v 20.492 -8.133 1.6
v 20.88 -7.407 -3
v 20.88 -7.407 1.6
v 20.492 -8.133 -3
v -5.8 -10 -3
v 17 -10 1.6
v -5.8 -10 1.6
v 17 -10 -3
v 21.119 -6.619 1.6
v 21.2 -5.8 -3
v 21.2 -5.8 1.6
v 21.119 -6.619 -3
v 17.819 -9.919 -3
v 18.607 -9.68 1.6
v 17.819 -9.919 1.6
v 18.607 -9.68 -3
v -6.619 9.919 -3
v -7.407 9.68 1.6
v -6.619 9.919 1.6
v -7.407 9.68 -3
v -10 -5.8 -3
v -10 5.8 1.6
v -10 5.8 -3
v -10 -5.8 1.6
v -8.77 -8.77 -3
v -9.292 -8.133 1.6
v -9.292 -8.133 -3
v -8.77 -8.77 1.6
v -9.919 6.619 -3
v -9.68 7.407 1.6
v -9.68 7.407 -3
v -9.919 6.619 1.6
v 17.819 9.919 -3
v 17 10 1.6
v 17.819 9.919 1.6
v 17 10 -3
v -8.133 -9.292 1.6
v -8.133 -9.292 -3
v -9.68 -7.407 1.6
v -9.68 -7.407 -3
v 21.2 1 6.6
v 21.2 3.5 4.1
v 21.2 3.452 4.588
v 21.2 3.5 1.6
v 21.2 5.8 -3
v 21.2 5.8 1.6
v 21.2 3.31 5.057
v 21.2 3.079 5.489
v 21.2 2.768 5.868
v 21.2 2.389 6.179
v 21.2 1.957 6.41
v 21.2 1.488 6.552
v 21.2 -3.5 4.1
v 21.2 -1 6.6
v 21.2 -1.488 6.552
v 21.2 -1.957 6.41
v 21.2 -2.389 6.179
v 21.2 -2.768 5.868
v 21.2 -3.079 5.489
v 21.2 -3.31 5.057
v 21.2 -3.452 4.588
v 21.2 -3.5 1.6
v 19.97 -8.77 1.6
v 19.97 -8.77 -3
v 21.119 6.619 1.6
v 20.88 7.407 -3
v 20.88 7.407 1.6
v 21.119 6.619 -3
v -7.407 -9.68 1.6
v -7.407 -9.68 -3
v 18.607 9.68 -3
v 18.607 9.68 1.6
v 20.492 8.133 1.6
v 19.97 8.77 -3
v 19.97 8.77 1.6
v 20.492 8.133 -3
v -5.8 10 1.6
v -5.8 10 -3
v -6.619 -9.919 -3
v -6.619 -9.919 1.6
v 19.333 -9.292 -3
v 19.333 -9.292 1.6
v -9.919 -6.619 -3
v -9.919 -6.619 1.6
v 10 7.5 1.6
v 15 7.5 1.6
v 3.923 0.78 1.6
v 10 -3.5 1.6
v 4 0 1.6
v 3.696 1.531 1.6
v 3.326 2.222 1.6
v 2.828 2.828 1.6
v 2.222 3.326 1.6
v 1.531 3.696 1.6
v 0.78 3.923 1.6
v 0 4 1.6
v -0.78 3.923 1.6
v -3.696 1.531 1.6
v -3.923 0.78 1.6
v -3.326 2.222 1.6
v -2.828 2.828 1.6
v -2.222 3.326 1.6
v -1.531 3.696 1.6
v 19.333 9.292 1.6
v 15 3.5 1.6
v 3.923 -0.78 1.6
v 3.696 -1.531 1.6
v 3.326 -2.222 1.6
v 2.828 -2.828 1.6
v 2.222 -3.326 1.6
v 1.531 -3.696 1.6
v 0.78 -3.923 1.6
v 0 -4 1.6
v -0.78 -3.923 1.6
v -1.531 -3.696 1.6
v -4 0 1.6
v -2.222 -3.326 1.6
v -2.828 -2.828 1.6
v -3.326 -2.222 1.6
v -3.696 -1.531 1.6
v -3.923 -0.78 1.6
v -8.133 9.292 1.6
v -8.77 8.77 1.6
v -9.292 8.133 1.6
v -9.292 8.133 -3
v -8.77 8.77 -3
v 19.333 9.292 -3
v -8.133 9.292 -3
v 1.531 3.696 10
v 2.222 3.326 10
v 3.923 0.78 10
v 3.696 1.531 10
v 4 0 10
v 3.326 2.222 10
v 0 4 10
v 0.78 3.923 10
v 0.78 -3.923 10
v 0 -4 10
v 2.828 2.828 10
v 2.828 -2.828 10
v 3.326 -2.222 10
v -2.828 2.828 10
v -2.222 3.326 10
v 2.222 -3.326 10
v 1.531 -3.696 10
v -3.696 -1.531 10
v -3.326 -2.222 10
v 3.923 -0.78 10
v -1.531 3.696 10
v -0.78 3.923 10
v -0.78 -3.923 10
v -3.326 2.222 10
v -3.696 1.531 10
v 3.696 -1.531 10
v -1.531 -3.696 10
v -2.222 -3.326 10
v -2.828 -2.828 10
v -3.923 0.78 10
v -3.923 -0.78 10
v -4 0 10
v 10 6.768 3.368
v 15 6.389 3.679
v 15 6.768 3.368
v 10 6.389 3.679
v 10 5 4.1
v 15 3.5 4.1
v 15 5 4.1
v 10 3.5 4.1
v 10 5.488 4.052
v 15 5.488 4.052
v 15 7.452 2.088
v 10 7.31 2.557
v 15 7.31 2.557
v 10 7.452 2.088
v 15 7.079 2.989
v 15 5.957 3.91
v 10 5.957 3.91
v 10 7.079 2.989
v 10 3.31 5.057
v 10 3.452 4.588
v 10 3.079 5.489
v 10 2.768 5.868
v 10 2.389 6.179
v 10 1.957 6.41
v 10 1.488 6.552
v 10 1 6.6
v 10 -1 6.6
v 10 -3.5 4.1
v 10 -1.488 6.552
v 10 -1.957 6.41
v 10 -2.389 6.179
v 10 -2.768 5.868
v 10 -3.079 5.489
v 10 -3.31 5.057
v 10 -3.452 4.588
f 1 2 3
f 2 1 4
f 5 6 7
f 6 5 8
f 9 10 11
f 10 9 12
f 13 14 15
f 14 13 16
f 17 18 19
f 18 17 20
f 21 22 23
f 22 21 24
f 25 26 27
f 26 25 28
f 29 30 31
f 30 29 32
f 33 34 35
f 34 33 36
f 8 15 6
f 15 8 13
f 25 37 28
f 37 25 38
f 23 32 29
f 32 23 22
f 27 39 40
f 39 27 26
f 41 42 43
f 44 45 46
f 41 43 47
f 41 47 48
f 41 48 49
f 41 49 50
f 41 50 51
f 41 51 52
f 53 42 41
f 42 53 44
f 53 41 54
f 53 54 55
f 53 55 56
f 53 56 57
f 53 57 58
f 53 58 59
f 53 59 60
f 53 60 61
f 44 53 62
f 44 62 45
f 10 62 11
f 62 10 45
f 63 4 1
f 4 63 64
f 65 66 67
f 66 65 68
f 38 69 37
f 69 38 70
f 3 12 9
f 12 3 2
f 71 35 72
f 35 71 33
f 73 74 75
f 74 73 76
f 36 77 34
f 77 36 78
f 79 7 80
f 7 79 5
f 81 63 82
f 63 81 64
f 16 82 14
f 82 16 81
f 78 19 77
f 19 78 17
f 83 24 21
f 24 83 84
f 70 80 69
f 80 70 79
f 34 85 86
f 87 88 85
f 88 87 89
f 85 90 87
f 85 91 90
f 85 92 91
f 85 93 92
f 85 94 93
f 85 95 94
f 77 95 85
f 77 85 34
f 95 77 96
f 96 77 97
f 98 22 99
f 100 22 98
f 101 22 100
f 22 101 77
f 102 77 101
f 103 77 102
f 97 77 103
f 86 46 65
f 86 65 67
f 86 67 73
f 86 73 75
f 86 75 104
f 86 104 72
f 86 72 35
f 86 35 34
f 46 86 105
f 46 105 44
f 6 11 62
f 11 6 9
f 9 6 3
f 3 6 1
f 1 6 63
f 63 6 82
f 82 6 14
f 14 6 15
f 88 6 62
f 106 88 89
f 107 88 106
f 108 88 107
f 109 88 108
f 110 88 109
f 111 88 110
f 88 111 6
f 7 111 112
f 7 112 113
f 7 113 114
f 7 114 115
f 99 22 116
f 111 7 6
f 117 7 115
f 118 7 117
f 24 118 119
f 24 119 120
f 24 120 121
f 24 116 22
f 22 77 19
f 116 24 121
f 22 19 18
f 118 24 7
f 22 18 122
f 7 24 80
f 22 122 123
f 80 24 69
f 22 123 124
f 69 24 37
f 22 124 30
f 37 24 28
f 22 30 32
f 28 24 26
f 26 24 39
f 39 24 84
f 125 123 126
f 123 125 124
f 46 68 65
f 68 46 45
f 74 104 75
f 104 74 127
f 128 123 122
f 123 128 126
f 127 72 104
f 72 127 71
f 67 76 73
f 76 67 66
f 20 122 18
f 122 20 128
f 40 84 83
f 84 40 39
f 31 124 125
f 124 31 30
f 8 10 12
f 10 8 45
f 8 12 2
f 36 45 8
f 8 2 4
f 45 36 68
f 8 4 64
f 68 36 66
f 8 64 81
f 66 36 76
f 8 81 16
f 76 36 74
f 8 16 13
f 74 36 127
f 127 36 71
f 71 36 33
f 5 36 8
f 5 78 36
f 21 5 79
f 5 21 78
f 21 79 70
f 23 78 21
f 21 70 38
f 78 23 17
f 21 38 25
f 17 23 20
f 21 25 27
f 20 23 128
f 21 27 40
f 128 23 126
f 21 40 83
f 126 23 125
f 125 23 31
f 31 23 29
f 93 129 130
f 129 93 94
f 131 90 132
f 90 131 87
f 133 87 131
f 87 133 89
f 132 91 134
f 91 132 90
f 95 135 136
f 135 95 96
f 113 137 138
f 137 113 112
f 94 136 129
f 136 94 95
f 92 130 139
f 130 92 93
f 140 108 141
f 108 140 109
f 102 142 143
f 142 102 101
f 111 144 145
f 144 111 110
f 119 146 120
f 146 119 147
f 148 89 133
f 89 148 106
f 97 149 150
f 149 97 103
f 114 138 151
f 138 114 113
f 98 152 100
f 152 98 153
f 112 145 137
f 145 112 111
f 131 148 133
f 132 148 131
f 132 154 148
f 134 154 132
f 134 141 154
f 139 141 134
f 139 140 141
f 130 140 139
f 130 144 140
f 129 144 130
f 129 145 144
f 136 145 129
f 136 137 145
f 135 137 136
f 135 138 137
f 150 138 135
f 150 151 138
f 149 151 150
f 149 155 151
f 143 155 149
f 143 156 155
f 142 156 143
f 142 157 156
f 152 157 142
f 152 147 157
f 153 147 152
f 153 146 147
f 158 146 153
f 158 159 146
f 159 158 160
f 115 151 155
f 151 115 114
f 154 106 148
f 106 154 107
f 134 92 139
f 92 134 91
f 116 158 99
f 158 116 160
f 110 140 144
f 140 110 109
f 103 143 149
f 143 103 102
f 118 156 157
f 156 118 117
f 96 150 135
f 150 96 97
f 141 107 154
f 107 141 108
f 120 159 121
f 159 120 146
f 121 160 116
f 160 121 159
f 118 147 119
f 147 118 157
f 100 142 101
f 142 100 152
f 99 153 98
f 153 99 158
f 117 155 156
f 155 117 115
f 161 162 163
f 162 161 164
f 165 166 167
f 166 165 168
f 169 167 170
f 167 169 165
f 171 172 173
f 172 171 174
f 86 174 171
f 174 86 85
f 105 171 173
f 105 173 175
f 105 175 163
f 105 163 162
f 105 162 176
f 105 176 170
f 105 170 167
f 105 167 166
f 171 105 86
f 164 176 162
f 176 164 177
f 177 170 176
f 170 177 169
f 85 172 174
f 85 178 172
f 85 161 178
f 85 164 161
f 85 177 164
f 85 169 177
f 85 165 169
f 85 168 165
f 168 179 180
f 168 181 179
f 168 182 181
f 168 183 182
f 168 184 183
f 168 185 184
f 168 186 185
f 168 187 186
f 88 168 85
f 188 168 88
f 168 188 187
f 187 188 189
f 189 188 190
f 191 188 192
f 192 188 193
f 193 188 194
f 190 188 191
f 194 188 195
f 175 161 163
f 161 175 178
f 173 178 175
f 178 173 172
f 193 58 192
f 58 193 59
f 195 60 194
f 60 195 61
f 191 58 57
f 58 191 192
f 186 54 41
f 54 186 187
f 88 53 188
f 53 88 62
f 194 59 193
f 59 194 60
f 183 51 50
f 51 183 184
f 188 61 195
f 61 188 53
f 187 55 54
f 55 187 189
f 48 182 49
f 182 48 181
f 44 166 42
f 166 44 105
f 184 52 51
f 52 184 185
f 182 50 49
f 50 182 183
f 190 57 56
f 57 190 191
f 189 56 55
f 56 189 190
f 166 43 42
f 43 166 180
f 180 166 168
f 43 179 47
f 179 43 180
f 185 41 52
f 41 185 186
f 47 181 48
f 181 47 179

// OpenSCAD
/**
 * Martin Egli
 * 2026-03-24
 * electronics
 */

module pcbAS5600_mount_holes_cut(cut_dia = 3.5, cut_len = 10, loc_res = 32) {
    a = (19.7+12.4)/2/2;
    translate([+a,+a, 0])
    cylinder(d = cut_dia, h = cut_len, $fn = loc_res);
    translate([+a, -a, 0])
    cylinder(d = cut_dia, h = cut_len, $fn = loc_res);
    translate([-a, +a, 0])
    cylinder(d = cut_dia, h = cut_len, $fn = loc_res);
    translate([-a, -a, 0])
    cylinder(d = cut_dia, h = cut_len, $fn = loc_res);
}
//pcbAS5600_mount_holes_cut();

module pcbAS5600_pcb(pcb_th = 1.5, loc_res = 32) {
    a = 23/2;
    r1 = 3;
    hull() {
        translate([+(a-r1), +(a-r1), 0])
        cylinder(r = r1, h = pcb_th, $fn = loc_res);
        translate([+(a-r1), -(a-r1), 0])
        cylinder(r = r1, h = pcb_th, $fn = loc_res);
        translate([-(a-r1), +(a-r1), 0])
        cylinder(r = r1, h = pcb_th, $fn = loc_res);
        translate([-(a-r1), -(a-r1), 0])
        cylinder(r = r1, h = pcb_th, $fn = loc_res);
    }
}
//pcbAS5600_pcb();

module pcbAS5600_pcb_cut(pcb_th = 2, loc_res = 32) {
    a = (23+1)/2;
    r1 = 3;
    hull() {
        translate([+(a-r1), +(a-r1), 0])
        cylinder(r = r1, h = pcb_th, $fn = loc_res);
        translate([+(a-r1), -(a-r1), 0])
        cylinder(r = r1, h = pcb_th, $fn = loc_res);
        translate([-(a-r1), +(a-r1), 0])
        cylinder(r = r1, h = pcb_th, $fn = loc_res);
        translate([-(a-r1), -(a-r1), 0])
        cylinder(r = r1, h = pcb_th, $fn = loc_res);
    }
}
//pcbAS5600_pcb_cut();

module pcbAS5600_pcb_cut2(pcb_th = 2, loc_res = 32) {
    a = (23+1)/2;
    r1 = 3;
    hull() {
        translate([+(a-r1), +(a-r1), 0])
        cylinder(r = r1, h = pcb_th, $fn = loc_res);
        translate([+(a-r1), -(a-r1), 0])
        cylinder(r = r1, h = pcb_th, $fn = loc_res);
        translate([-(a-r1), +(a-r1), 0])
        cylinder(r = r1, h = pcb_th, $fn = loc_res);
        translate([-(a-r1), -(a-r1), 0])
        cylinder(r = r1, h = pcb_th, $fn = loc_res);
    }
    translate([-10/2, -24/2, 0])
    cube([10, 24, 3]);
    translate([-24/2, -10/2, 0])
    cube([24, 10, 3]);
}
//pcbAS5600_pcb_cut2();

module pcbMT6701_mount_holes_cut(cut_dia = 3.1, cut_len = 10, loc_res = 32) {
    a = (17)/2;
    translate([+a,+a, 0])
    cylinder(d = cut_dia, h = cut_len, $fn = loc_res);
    translate([+a, -a, 0])
    cylinder(d = cut_dia, h = cut_len, $fn = loc_res);
    translate([-a, +a, 0])
    cylinder(d = cut_dia, h = cut_len, $fn = loc_res);
    translate([-a, -a, 0])
    cylinder(d = cut_dia, h = cut_len, $fn = loc_res);
}
//pcbMT6701_mount_holes_cut();

module pcbMT6701_pcb(pcb_th = 1.5, loc_res = 32) {
    a = 23/2;
    r1 = 3;
    hull() {
        translate([+(a-r1), +(a-r1), 0])
        cylinder(r = r1, h = pcb_th, $fn = loc_res);
        translate([+(a-r1), -(a-r1), 0])
        cylinder(r = r1, h = pcb_th, $fn = loc_res);
        translate([-(a-r1), +(a-r1), 0])
        cylinder(r = r1, h = pcb_th, $fn = loc_res);
        translate([-(a-r1), -(a-r1), 0])
        cylinder(r = r1, h = pcb_th, $fn = loc_res);
    }
}
//pcbMT6701_pcb();

module pcbMT6701_pcb_cut(pcb_th = 2, loc_res = 32) {
    a = (23+1)/2;
    r1 = 3;
    hull() {
        translate([+(a-r1), +(a-r1), 0])
        cylinder(r = r1, h = pcb_th, $fn = loc_res);
        translate([+(a-r1), -(a-r1), 0])
        cylinder(r = r1, h = pcb_th, $fn = loc_res);
        translate([-(a-r1), +(a-r1), 0])
        cylinder(r = r1, h = pcb_th, $fn = loc_res);
        translate([-(a-r1), -(a-r1), 0])
        cylinder(r = r1, h = pcb_th, $fn = loc_res);
    }
}
//pcbMT6701_pcb_cut();

module pcbMT6701(loc_res = 32) {
    difference() {
        union() {
            color("Gray")
            translate([0, 0, 0])
            pcbAS5600_pcb();
            // SOIC-8 4*5 mm
            color("DarkGray")
            translate([-2, -2.5, 1.5])
            cube([4, 5, 1]);
        }
        translate([0, 0, -1])
        pcbMT6701_mount_holes_cut();
    }
}
//pcbMT6701();

module pcbbal01MA702Q(loc_res = 32) {
    th = 1.6;
    // PCB
    color("Green")
    difference() {
        hull() {
            translate([+17.0, -5.8, 0])
            cylinder(r = 4, h = th, $fn = loc_res);
            translate([+17.0, +5.8, 0])
            cylinder(r = 4, h = th, $fn = loc_res);
            translate([-5.8, -5.8, 0])
            cylinder(r = 4, h = th, $fn = loc_res);
            translate([-5.8, +5.8, 0])
            cylinder(r = 4, h = th, $fn = loc_res);
        }
        // cut M3 holes
        hull() {
            translate([+6.8, +6.8373, -1])
            cylinder(d = 3.2, h = th+2, $fn = loc_res);
            translate([+5.7127, +5.75, -1])
            cylinder(d = 3.2, h = th+2, $fn = loc_res);
        }
        hull() {
            translate([+6.8, -6.8373, -1])
            cylinder(d = 3.2, h = th+2, $fn = loc_res);
            translate([+5.7127, -5.75, -1])
            cylinder(d = 3.2, h = th+2, $fn = loc_res);
        }
        hull() {
            translate([-6.8, +6.8373, -1])
            cylinder(d = 3.2, h = th+2, $fn = loc_res);
            translate([-5.7127, +5.75, -1])
            cylinder(d = 3.2, h = th+2, $fn = loc_res);
        }
        hull() {
            translate([-6.8, -6.8373, -1])
            cylinder(d = 3.2, h = th+2, $fn = loc_res);
            translate([-5.7127, -5.75, -1])
            cylinder(d = 3.2, h = th+2, $fn = loc_res);
        }
    }
    
    // sensor
    color("DarkGray")
    translate([-3.2/2, -3.2/2, th])
    cube([3.2, 3.2, 1.2]);
    
    // LDO SOT-23
    color("DarkGray")
    translate([12.4, 5.1, th])
    translate([-3.2/2, -1.6/2, 0])
    cube([3.2, 1.6, 1.2]);
    
    // cable
    color("Black")
    translate([17.5, 0, th+4/2])
    rotate([0, 90, 0])
    cylinder(d = 4, h = 10, $fn = loc_res);
}
*pcbbal01MA702Q();

module pcbbal01MA702Q_cut(loc_res = 32) {
    th = 1.6;
    // PCB
    translate([0, 0, -3])
    hull() {
        translate([+17.0, -5.8, 0])
        cylinder(r = 4.2, h = th+3, $fn = loc_res);
        translate([+17.0, +5.8, 0])
        cylinder(r = 4.2, h = th+3, $fn = loc_res);
        translate([-5.8, -5.8, 0])
        cylinder(r = 4.2, h = th+3, $fn = loc_res);
        translate([-5.8, +5.8, 0])
        cylinder(r = 4.2, h = th+3, $fn = loc_res);
    }
    
    // sensor -> center hole upwards
    translate([0, 0, 0])
    cylinder(d = 8, h = 10, $fn = loc_res);

    // LDO SOT-23
    hull() {
        translate([10, 5, th])
        rotate([0, 90, 0])
        cylinder(d = 5, h = 5, $fn = loc_res);    
        translate([10, 0, th])
        rotate([0, 90, 0])
        cylinder(d = 5, h = 5, $fn = loc_res);    
    }
    // cable
    hull() {
        translate([10, +(7-5)/2, th+5/2])
        rotate([0, 90, 0])
        cylinder(d = 5, h = 11.2, $fn = loc_res);
        translate([10, -(7-5)/2, th+5/2])
        rotate([0, 90, 0])
        cylinder(d = 5, h = 11.2, $fn = loc_res);
        translate([10, -7/2, 0])
        cube([11.2, 7, 1]);
    }    
}
pcbbal01MA702Q_cut();
